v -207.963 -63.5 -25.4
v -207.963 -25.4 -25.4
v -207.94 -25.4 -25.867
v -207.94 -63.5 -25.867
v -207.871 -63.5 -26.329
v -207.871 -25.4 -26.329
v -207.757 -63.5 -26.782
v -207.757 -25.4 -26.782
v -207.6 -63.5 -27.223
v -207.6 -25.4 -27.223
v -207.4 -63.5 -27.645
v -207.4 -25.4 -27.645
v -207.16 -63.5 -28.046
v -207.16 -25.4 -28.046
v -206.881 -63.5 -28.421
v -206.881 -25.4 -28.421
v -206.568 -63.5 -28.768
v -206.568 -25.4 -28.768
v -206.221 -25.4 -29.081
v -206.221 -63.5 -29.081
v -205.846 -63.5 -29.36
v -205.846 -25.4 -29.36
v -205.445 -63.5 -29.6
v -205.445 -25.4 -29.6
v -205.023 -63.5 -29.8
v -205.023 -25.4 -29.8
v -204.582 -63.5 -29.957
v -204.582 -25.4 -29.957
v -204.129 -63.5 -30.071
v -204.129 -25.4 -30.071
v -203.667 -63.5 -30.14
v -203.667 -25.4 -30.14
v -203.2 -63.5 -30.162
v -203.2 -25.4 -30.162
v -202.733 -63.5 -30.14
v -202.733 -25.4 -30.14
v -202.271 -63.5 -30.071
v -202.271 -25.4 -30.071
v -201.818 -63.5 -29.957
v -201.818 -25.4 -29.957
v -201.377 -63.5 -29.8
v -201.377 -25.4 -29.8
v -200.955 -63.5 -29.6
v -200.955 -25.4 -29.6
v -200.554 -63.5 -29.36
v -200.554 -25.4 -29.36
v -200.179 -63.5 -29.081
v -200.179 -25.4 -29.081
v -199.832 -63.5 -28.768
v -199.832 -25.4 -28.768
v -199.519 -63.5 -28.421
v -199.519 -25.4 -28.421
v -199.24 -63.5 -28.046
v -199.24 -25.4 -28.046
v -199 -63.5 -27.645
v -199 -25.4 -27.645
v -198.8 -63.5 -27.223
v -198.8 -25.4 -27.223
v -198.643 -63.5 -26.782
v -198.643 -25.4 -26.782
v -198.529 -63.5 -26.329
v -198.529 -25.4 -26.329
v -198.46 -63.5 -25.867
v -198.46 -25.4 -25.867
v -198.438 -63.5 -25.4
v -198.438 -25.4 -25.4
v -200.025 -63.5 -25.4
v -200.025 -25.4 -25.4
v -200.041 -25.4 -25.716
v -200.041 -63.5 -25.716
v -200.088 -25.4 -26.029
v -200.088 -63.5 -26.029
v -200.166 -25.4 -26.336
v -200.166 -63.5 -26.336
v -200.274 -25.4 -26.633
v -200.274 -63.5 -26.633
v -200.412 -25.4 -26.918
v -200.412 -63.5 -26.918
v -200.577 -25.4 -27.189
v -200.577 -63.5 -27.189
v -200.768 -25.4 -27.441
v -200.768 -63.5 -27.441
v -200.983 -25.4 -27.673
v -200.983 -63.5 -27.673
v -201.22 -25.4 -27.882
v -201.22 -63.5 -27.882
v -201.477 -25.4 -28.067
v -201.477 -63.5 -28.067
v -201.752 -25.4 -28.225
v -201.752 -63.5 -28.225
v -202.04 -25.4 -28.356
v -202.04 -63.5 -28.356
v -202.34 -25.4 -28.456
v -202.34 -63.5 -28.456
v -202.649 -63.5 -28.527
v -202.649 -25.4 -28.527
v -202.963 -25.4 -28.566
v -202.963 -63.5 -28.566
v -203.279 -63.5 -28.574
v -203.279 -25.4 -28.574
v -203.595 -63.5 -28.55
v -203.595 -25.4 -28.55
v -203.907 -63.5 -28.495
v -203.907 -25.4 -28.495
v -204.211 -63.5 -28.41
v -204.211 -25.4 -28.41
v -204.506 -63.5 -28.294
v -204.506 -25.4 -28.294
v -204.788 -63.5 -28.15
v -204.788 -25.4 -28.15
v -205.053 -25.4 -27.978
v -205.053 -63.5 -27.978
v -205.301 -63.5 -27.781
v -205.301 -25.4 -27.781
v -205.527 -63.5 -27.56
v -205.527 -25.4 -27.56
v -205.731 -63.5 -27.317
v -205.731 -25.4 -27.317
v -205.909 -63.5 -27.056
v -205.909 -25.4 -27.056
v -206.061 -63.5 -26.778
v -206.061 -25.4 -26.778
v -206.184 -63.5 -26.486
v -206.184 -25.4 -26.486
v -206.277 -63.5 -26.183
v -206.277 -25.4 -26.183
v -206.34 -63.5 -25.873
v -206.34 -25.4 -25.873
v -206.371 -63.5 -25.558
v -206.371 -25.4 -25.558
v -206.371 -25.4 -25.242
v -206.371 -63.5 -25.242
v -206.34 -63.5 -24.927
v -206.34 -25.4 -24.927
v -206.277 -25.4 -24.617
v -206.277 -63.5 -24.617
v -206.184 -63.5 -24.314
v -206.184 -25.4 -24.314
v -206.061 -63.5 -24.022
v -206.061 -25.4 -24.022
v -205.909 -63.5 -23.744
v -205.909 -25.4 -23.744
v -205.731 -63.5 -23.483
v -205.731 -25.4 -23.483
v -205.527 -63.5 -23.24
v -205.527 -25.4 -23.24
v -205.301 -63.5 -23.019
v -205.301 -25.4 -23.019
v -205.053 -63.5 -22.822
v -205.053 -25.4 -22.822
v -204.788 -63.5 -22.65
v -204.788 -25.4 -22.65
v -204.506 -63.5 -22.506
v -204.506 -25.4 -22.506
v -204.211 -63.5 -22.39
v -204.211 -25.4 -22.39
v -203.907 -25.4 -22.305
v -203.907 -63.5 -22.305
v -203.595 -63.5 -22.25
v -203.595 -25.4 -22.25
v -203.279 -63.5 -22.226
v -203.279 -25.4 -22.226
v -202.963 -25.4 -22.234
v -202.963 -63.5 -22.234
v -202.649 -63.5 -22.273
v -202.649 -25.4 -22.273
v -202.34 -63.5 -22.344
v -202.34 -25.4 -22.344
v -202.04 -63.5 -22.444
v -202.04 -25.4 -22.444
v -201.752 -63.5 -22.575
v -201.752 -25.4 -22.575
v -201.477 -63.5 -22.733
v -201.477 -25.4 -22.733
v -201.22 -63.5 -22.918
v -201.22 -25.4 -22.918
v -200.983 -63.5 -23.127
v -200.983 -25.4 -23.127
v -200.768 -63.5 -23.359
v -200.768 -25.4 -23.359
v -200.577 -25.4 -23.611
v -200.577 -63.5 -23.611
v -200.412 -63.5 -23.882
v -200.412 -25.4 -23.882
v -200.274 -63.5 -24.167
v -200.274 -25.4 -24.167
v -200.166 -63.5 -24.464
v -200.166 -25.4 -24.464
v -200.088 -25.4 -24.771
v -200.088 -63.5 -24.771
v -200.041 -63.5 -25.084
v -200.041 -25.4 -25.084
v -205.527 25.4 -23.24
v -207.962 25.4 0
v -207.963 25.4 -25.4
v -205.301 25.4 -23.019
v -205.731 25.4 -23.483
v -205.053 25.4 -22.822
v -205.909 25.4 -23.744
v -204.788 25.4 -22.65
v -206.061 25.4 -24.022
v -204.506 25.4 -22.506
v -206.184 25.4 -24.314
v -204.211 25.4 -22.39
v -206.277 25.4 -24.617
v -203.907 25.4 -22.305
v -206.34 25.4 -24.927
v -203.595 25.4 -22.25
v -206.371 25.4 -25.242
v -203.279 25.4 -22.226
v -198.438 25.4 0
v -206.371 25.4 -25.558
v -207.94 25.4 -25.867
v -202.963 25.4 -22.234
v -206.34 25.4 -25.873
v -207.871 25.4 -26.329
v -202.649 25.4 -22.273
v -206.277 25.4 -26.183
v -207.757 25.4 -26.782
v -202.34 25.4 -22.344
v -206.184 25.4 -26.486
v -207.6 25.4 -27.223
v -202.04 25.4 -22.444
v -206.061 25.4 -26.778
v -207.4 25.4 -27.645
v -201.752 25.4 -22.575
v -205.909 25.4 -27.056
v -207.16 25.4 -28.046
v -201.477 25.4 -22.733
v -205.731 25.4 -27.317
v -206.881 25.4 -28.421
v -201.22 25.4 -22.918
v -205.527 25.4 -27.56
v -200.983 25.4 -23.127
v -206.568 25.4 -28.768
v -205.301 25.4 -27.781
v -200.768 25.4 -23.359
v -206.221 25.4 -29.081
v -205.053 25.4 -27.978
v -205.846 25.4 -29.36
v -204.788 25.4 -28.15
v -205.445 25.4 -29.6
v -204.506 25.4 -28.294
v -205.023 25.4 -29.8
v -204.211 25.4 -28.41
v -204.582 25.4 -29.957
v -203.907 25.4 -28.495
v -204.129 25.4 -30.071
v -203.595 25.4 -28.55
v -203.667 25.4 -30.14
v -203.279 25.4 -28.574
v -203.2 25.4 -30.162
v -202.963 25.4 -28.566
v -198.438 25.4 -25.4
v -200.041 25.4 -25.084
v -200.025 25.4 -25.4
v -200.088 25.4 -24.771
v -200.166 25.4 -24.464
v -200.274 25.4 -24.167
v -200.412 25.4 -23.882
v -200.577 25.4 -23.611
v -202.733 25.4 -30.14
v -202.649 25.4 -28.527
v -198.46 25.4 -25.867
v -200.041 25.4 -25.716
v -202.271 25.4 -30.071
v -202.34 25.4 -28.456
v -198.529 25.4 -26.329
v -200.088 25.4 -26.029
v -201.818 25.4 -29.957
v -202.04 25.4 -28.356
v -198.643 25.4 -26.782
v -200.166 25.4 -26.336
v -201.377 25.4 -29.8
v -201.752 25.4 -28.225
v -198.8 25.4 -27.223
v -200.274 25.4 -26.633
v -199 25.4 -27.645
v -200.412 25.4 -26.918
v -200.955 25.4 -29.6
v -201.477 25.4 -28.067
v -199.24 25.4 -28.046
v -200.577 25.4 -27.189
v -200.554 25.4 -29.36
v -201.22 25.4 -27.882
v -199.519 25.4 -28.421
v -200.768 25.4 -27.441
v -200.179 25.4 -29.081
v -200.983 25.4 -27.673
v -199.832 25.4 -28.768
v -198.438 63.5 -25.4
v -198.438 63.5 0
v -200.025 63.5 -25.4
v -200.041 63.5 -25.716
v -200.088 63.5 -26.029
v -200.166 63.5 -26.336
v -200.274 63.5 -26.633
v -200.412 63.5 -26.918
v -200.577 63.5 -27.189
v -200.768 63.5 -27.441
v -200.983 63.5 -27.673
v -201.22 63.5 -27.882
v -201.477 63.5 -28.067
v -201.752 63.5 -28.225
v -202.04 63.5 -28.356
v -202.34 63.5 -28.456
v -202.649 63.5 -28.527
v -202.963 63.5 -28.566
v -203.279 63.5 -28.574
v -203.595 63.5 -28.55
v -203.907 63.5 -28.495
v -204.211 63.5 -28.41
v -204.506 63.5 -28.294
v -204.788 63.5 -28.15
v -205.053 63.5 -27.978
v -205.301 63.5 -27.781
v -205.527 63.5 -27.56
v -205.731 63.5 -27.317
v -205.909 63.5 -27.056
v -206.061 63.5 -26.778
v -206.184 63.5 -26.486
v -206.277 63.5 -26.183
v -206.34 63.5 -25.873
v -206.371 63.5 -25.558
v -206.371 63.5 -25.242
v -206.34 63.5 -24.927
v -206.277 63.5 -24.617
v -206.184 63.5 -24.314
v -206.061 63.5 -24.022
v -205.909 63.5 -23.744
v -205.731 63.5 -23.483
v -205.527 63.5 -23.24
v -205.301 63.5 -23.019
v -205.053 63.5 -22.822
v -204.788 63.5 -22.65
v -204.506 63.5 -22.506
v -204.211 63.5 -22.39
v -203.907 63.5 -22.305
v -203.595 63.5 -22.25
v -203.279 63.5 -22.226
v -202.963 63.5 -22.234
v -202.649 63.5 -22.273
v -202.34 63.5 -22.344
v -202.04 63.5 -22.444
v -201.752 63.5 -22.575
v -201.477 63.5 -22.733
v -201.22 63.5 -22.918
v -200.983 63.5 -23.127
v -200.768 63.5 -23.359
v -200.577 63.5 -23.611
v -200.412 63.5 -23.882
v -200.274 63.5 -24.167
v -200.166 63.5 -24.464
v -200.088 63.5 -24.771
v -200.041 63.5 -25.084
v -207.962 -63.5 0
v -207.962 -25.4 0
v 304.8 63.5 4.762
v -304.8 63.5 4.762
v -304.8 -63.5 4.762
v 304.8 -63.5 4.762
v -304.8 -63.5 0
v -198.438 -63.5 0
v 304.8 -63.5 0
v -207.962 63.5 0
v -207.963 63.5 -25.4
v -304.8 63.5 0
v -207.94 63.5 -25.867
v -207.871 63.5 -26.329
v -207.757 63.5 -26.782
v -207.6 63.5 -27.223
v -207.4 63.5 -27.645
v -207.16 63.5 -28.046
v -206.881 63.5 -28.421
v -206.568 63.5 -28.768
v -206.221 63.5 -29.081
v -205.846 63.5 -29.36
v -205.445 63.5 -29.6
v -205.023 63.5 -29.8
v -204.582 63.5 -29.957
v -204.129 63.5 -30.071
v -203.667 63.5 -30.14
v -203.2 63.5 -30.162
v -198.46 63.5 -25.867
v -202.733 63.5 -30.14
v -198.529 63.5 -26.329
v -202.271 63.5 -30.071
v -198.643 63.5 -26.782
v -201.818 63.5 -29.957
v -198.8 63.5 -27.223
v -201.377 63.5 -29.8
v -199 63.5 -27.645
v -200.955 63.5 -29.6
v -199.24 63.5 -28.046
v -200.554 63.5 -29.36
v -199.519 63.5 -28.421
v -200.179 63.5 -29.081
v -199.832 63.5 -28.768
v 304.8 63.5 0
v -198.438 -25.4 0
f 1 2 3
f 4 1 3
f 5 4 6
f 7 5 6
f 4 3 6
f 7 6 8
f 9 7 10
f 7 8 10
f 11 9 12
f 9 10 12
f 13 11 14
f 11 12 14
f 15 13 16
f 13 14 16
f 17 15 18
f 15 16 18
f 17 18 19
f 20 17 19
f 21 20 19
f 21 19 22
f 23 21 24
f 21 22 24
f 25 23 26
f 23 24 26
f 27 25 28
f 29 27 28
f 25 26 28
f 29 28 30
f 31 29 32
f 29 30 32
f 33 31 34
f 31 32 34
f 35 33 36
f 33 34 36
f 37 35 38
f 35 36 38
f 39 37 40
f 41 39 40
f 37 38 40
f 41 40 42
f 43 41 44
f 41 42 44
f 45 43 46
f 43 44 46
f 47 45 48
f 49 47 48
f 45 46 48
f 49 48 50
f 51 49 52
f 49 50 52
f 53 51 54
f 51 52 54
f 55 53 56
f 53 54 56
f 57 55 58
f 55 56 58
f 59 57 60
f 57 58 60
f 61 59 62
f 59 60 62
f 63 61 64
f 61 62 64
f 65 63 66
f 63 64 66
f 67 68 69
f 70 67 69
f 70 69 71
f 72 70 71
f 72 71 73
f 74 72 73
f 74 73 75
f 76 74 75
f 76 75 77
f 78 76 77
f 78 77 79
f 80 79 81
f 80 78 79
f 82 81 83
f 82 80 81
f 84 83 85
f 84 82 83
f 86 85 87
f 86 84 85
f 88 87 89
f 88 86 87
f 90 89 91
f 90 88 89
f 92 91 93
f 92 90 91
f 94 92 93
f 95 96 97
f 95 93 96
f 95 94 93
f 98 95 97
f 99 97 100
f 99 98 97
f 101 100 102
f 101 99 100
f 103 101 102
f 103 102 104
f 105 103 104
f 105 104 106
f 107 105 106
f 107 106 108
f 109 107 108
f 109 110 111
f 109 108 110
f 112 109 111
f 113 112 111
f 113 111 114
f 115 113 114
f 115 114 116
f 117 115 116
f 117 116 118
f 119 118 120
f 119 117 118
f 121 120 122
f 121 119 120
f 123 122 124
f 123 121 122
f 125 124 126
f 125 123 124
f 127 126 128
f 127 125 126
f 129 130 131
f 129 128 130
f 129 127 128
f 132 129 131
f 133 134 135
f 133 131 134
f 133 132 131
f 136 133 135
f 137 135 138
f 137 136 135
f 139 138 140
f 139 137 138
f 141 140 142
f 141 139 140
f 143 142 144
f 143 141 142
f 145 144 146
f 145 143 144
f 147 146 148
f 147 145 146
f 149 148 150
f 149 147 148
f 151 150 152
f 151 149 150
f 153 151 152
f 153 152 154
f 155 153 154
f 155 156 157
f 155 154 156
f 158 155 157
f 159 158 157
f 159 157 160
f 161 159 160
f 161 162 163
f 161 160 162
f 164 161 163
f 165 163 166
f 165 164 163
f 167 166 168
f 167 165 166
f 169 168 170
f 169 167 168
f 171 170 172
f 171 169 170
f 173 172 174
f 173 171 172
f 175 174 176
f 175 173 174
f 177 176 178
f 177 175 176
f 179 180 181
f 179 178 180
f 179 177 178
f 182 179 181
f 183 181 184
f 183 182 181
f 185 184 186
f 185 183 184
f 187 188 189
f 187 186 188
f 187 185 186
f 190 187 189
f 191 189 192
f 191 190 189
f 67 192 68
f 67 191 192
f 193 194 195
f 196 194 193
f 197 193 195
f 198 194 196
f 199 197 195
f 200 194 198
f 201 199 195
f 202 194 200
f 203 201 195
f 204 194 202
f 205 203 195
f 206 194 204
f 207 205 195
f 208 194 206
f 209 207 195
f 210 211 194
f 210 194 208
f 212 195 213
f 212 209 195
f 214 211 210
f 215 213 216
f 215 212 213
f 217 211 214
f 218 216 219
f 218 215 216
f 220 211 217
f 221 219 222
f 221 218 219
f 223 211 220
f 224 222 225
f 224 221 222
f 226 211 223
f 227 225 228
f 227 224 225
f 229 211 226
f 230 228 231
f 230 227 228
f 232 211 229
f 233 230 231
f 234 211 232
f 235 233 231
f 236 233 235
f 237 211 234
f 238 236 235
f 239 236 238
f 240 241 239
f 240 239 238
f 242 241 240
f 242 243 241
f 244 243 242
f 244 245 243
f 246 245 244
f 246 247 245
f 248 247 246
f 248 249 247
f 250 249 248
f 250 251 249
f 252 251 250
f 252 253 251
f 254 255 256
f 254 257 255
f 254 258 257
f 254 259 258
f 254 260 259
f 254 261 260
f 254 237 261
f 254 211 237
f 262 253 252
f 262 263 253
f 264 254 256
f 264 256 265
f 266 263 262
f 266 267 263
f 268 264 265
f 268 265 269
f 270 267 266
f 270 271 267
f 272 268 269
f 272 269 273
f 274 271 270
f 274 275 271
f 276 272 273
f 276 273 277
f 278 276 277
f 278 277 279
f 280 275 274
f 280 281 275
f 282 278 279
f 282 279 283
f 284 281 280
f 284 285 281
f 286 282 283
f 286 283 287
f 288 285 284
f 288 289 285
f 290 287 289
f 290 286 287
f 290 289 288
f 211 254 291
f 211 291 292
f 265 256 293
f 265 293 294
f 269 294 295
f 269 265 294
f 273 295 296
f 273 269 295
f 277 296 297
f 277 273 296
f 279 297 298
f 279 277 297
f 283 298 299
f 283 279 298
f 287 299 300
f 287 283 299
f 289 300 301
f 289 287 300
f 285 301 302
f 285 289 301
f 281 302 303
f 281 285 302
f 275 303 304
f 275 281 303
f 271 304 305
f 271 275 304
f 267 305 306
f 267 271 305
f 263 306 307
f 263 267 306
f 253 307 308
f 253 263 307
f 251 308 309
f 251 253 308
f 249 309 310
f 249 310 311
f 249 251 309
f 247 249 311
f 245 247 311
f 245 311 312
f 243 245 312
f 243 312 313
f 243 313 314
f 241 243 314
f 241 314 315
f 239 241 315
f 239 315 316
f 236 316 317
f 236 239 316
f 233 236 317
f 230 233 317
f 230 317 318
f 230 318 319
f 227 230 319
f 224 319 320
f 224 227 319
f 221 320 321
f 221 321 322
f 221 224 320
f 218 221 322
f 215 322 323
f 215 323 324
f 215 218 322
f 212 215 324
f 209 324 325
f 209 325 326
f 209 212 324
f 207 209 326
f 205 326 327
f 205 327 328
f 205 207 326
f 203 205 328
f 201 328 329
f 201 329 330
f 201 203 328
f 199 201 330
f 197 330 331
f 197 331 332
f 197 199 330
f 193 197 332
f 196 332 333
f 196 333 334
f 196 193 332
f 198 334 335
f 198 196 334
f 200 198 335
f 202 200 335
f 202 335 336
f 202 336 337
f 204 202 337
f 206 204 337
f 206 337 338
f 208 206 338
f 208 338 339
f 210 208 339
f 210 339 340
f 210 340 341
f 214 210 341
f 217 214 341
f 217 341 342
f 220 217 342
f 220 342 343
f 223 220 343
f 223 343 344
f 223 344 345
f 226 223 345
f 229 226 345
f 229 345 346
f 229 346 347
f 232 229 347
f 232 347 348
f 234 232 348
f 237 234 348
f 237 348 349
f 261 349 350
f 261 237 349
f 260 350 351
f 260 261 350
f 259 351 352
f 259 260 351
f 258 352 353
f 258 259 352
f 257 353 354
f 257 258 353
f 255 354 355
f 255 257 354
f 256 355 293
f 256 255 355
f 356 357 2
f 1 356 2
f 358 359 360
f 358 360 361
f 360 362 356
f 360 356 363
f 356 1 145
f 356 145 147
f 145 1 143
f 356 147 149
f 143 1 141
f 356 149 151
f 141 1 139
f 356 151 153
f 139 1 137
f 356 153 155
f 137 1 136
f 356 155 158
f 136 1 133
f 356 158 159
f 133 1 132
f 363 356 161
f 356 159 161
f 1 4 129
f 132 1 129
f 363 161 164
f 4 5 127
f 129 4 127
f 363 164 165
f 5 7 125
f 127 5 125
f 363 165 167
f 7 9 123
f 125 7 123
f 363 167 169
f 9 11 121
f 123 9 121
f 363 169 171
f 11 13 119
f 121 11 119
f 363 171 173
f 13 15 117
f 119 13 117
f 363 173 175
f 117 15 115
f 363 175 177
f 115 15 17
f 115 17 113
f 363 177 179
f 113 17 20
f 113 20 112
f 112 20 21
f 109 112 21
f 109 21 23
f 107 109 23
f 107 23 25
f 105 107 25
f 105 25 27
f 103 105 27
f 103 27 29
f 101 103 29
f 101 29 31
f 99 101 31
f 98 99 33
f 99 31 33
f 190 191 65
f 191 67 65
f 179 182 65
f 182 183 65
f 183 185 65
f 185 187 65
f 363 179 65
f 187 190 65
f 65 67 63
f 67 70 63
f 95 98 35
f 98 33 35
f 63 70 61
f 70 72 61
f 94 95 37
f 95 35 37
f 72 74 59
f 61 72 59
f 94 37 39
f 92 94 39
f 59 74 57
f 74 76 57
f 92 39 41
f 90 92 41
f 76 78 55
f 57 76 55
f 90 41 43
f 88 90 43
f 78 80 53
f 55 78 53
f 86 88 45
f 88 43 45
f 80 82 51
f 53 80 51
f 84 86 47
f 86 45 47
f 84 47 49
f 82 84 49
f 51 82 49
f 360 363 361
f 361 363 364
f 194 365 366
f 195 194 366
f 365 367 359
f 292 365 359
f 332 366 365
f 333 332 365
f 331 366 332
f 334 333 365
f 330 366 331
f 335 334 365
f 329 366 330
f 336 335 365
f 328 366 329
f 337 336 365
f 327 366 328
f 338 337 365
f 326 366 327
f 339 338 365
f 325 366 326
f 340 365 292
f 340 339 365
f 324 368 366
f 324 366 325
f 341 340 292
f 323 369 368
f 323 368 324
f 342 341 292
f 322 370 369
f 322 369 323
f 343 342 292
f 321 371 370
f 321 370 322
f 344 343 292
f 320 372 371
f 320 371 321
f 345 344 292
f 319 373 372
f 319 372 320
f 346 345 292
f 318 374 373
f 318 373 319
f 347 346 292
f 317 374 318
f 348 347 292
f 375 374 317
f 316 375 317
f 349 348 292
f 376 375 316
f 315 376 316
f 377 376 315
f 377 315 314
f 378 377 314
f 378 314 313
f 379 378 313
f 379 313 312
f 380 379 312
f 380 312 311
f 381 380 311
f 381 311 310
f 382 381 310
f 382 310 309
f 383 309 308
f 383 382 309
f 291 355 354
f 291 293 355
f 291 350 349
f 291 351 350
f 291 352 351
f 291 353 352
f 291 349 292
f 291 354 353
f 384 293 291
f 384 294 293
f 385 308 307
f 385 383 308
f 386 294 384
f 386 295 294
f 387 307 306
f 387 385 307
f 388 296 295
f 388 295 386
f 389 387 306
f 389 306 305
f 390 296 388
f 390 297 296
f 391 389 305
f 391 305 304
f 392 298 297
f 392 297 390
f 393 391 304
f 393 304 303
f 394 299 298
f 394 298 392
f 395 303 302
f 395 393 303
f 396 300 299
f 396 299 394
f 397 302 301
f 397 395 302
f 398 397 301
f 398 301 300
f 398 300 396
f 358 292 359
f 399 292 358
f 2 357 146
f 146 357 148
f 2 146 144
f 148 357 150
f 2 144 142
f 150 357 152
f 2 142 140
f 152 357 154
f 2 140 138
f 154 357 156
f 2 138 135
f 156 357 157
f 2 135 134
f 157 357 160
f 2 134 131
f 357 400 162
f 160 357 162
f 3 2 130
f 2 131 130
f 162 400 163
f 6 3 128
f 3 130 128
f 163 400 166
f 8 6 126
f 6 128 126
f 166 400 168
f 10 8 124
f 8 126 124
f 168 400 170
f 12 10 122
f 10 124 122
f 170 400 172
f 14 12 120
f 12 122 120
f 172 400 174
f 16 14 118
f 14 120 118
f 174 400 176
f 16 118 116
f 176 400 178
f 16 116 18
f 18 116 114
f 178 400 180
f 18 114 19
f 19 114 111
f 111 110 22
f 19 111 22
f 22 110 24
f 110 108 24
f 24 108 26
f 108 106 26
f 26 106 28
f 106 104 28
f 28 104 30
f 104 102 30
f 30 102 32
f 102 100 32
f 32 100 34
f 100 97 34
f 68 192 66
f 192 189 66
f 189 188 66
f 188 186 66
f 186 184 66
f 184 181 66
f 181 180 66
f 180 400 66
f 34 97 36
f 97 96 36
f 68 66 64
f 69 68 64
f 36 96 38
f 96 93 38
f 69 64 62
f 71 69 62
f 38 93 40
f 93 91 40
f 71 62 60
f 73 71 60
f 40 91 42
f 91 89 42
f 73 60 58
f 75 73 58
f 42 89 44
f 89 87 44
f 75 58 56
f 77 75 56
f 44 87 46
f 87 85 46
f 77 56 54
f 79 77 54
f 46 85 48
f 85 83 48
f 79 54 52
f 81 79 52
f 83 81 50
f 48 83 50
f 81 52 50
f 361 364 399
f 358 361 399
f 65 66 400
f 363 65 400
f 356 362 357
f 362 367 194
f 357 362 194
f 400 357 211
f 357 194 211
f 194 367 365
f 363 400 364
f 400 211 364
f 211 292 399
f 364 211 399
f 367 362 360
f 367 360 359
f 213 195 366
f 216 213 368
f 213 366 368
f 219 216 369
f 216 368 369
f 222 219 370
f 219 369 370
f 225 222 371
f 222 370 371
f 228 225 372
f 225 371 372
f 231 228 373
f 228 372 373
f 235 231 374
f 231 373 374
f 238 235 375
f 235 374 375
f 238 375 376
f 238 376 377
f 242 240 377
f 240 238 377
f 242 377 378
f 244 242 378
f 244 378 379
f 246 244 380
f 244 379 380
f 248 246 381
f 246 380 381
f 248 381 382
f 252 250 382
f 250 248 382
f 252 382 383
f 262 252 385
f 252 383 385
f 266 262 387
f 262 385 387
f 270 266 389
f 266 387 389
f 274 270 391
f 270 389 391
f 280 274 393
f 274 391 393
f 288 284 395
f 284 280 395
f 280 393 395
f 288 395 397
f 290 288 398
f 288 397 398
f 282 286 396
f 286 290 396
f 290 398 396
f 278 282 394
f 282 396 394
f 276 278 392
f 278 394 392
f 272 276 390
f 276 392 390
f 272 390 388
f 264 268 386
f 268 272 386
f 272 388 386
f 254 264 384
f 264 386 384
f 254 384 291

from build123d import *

# Parameters (mm, degrees)
SKETCH1_W           = 609.6
SKETCH1_H           = 127
BOSS_EXTRUDE2_DEPTH = 4.7625
SKETCH3_R           = 3.175
BOSS_EXTRUDE3_DEPTH = 63.5
SKETCH4_W           = 30.1625
SKETCH4_H           = 50.8
CUT_EXTRUDE1_DEPTH  = 107.3625


with BuildPart() as part:
    # Sketch1 → Boss-Extrude2 (new body)
    with BuildSketch(Plane.XY):
        Rectangle(SKETCH1_W, SKETCH1_H)
    extrude(amount=BOSS_EXTRUDE2_DEPTH)

    # Sketch3 → Boss-Extrude3 (add, symmetric)
    with BuildSketch(Plane(origin=(0, 0, 0), x_dir=(1, 0, 0), z_dir=(0, 1, 0))):
        with BuildLine():
            Line((-207.9625, 0), (-207.9625, 25.4))
            ThreePointArc((-207.9625, 25.4), (-203.2, 30.1625), (-198.4375, 25.4))
            Line((-198.4375, 25.4), (-198.4375, 0))
            Line((-198.4375, 0), (-207.9625, 0))
        make_face()
        with Locations((-203.2, 25.4)):
            Circle(SKETCH3_R, mode=Mode.SUBTRACT)
    extrude(amount=BOSS_EXTRUDE3_DEPTH, both=True)

    # Sketch4 → Cut-Extrude1 (cut, through all)
    with BuildSketch(Plane(origin=(-198.4375, 0, 0), x_dir=(0, 0, -1), z_dir=(1, 0, 0))):
        with Locations((15.08125, 0)):
            Rectangle(SKETCH4_W, SKETCH4_H)
    extrude(amount=-CUT_EXTRUDE1_DEPTH, mode=Mode.SUBTRACT)


solid = part.part
